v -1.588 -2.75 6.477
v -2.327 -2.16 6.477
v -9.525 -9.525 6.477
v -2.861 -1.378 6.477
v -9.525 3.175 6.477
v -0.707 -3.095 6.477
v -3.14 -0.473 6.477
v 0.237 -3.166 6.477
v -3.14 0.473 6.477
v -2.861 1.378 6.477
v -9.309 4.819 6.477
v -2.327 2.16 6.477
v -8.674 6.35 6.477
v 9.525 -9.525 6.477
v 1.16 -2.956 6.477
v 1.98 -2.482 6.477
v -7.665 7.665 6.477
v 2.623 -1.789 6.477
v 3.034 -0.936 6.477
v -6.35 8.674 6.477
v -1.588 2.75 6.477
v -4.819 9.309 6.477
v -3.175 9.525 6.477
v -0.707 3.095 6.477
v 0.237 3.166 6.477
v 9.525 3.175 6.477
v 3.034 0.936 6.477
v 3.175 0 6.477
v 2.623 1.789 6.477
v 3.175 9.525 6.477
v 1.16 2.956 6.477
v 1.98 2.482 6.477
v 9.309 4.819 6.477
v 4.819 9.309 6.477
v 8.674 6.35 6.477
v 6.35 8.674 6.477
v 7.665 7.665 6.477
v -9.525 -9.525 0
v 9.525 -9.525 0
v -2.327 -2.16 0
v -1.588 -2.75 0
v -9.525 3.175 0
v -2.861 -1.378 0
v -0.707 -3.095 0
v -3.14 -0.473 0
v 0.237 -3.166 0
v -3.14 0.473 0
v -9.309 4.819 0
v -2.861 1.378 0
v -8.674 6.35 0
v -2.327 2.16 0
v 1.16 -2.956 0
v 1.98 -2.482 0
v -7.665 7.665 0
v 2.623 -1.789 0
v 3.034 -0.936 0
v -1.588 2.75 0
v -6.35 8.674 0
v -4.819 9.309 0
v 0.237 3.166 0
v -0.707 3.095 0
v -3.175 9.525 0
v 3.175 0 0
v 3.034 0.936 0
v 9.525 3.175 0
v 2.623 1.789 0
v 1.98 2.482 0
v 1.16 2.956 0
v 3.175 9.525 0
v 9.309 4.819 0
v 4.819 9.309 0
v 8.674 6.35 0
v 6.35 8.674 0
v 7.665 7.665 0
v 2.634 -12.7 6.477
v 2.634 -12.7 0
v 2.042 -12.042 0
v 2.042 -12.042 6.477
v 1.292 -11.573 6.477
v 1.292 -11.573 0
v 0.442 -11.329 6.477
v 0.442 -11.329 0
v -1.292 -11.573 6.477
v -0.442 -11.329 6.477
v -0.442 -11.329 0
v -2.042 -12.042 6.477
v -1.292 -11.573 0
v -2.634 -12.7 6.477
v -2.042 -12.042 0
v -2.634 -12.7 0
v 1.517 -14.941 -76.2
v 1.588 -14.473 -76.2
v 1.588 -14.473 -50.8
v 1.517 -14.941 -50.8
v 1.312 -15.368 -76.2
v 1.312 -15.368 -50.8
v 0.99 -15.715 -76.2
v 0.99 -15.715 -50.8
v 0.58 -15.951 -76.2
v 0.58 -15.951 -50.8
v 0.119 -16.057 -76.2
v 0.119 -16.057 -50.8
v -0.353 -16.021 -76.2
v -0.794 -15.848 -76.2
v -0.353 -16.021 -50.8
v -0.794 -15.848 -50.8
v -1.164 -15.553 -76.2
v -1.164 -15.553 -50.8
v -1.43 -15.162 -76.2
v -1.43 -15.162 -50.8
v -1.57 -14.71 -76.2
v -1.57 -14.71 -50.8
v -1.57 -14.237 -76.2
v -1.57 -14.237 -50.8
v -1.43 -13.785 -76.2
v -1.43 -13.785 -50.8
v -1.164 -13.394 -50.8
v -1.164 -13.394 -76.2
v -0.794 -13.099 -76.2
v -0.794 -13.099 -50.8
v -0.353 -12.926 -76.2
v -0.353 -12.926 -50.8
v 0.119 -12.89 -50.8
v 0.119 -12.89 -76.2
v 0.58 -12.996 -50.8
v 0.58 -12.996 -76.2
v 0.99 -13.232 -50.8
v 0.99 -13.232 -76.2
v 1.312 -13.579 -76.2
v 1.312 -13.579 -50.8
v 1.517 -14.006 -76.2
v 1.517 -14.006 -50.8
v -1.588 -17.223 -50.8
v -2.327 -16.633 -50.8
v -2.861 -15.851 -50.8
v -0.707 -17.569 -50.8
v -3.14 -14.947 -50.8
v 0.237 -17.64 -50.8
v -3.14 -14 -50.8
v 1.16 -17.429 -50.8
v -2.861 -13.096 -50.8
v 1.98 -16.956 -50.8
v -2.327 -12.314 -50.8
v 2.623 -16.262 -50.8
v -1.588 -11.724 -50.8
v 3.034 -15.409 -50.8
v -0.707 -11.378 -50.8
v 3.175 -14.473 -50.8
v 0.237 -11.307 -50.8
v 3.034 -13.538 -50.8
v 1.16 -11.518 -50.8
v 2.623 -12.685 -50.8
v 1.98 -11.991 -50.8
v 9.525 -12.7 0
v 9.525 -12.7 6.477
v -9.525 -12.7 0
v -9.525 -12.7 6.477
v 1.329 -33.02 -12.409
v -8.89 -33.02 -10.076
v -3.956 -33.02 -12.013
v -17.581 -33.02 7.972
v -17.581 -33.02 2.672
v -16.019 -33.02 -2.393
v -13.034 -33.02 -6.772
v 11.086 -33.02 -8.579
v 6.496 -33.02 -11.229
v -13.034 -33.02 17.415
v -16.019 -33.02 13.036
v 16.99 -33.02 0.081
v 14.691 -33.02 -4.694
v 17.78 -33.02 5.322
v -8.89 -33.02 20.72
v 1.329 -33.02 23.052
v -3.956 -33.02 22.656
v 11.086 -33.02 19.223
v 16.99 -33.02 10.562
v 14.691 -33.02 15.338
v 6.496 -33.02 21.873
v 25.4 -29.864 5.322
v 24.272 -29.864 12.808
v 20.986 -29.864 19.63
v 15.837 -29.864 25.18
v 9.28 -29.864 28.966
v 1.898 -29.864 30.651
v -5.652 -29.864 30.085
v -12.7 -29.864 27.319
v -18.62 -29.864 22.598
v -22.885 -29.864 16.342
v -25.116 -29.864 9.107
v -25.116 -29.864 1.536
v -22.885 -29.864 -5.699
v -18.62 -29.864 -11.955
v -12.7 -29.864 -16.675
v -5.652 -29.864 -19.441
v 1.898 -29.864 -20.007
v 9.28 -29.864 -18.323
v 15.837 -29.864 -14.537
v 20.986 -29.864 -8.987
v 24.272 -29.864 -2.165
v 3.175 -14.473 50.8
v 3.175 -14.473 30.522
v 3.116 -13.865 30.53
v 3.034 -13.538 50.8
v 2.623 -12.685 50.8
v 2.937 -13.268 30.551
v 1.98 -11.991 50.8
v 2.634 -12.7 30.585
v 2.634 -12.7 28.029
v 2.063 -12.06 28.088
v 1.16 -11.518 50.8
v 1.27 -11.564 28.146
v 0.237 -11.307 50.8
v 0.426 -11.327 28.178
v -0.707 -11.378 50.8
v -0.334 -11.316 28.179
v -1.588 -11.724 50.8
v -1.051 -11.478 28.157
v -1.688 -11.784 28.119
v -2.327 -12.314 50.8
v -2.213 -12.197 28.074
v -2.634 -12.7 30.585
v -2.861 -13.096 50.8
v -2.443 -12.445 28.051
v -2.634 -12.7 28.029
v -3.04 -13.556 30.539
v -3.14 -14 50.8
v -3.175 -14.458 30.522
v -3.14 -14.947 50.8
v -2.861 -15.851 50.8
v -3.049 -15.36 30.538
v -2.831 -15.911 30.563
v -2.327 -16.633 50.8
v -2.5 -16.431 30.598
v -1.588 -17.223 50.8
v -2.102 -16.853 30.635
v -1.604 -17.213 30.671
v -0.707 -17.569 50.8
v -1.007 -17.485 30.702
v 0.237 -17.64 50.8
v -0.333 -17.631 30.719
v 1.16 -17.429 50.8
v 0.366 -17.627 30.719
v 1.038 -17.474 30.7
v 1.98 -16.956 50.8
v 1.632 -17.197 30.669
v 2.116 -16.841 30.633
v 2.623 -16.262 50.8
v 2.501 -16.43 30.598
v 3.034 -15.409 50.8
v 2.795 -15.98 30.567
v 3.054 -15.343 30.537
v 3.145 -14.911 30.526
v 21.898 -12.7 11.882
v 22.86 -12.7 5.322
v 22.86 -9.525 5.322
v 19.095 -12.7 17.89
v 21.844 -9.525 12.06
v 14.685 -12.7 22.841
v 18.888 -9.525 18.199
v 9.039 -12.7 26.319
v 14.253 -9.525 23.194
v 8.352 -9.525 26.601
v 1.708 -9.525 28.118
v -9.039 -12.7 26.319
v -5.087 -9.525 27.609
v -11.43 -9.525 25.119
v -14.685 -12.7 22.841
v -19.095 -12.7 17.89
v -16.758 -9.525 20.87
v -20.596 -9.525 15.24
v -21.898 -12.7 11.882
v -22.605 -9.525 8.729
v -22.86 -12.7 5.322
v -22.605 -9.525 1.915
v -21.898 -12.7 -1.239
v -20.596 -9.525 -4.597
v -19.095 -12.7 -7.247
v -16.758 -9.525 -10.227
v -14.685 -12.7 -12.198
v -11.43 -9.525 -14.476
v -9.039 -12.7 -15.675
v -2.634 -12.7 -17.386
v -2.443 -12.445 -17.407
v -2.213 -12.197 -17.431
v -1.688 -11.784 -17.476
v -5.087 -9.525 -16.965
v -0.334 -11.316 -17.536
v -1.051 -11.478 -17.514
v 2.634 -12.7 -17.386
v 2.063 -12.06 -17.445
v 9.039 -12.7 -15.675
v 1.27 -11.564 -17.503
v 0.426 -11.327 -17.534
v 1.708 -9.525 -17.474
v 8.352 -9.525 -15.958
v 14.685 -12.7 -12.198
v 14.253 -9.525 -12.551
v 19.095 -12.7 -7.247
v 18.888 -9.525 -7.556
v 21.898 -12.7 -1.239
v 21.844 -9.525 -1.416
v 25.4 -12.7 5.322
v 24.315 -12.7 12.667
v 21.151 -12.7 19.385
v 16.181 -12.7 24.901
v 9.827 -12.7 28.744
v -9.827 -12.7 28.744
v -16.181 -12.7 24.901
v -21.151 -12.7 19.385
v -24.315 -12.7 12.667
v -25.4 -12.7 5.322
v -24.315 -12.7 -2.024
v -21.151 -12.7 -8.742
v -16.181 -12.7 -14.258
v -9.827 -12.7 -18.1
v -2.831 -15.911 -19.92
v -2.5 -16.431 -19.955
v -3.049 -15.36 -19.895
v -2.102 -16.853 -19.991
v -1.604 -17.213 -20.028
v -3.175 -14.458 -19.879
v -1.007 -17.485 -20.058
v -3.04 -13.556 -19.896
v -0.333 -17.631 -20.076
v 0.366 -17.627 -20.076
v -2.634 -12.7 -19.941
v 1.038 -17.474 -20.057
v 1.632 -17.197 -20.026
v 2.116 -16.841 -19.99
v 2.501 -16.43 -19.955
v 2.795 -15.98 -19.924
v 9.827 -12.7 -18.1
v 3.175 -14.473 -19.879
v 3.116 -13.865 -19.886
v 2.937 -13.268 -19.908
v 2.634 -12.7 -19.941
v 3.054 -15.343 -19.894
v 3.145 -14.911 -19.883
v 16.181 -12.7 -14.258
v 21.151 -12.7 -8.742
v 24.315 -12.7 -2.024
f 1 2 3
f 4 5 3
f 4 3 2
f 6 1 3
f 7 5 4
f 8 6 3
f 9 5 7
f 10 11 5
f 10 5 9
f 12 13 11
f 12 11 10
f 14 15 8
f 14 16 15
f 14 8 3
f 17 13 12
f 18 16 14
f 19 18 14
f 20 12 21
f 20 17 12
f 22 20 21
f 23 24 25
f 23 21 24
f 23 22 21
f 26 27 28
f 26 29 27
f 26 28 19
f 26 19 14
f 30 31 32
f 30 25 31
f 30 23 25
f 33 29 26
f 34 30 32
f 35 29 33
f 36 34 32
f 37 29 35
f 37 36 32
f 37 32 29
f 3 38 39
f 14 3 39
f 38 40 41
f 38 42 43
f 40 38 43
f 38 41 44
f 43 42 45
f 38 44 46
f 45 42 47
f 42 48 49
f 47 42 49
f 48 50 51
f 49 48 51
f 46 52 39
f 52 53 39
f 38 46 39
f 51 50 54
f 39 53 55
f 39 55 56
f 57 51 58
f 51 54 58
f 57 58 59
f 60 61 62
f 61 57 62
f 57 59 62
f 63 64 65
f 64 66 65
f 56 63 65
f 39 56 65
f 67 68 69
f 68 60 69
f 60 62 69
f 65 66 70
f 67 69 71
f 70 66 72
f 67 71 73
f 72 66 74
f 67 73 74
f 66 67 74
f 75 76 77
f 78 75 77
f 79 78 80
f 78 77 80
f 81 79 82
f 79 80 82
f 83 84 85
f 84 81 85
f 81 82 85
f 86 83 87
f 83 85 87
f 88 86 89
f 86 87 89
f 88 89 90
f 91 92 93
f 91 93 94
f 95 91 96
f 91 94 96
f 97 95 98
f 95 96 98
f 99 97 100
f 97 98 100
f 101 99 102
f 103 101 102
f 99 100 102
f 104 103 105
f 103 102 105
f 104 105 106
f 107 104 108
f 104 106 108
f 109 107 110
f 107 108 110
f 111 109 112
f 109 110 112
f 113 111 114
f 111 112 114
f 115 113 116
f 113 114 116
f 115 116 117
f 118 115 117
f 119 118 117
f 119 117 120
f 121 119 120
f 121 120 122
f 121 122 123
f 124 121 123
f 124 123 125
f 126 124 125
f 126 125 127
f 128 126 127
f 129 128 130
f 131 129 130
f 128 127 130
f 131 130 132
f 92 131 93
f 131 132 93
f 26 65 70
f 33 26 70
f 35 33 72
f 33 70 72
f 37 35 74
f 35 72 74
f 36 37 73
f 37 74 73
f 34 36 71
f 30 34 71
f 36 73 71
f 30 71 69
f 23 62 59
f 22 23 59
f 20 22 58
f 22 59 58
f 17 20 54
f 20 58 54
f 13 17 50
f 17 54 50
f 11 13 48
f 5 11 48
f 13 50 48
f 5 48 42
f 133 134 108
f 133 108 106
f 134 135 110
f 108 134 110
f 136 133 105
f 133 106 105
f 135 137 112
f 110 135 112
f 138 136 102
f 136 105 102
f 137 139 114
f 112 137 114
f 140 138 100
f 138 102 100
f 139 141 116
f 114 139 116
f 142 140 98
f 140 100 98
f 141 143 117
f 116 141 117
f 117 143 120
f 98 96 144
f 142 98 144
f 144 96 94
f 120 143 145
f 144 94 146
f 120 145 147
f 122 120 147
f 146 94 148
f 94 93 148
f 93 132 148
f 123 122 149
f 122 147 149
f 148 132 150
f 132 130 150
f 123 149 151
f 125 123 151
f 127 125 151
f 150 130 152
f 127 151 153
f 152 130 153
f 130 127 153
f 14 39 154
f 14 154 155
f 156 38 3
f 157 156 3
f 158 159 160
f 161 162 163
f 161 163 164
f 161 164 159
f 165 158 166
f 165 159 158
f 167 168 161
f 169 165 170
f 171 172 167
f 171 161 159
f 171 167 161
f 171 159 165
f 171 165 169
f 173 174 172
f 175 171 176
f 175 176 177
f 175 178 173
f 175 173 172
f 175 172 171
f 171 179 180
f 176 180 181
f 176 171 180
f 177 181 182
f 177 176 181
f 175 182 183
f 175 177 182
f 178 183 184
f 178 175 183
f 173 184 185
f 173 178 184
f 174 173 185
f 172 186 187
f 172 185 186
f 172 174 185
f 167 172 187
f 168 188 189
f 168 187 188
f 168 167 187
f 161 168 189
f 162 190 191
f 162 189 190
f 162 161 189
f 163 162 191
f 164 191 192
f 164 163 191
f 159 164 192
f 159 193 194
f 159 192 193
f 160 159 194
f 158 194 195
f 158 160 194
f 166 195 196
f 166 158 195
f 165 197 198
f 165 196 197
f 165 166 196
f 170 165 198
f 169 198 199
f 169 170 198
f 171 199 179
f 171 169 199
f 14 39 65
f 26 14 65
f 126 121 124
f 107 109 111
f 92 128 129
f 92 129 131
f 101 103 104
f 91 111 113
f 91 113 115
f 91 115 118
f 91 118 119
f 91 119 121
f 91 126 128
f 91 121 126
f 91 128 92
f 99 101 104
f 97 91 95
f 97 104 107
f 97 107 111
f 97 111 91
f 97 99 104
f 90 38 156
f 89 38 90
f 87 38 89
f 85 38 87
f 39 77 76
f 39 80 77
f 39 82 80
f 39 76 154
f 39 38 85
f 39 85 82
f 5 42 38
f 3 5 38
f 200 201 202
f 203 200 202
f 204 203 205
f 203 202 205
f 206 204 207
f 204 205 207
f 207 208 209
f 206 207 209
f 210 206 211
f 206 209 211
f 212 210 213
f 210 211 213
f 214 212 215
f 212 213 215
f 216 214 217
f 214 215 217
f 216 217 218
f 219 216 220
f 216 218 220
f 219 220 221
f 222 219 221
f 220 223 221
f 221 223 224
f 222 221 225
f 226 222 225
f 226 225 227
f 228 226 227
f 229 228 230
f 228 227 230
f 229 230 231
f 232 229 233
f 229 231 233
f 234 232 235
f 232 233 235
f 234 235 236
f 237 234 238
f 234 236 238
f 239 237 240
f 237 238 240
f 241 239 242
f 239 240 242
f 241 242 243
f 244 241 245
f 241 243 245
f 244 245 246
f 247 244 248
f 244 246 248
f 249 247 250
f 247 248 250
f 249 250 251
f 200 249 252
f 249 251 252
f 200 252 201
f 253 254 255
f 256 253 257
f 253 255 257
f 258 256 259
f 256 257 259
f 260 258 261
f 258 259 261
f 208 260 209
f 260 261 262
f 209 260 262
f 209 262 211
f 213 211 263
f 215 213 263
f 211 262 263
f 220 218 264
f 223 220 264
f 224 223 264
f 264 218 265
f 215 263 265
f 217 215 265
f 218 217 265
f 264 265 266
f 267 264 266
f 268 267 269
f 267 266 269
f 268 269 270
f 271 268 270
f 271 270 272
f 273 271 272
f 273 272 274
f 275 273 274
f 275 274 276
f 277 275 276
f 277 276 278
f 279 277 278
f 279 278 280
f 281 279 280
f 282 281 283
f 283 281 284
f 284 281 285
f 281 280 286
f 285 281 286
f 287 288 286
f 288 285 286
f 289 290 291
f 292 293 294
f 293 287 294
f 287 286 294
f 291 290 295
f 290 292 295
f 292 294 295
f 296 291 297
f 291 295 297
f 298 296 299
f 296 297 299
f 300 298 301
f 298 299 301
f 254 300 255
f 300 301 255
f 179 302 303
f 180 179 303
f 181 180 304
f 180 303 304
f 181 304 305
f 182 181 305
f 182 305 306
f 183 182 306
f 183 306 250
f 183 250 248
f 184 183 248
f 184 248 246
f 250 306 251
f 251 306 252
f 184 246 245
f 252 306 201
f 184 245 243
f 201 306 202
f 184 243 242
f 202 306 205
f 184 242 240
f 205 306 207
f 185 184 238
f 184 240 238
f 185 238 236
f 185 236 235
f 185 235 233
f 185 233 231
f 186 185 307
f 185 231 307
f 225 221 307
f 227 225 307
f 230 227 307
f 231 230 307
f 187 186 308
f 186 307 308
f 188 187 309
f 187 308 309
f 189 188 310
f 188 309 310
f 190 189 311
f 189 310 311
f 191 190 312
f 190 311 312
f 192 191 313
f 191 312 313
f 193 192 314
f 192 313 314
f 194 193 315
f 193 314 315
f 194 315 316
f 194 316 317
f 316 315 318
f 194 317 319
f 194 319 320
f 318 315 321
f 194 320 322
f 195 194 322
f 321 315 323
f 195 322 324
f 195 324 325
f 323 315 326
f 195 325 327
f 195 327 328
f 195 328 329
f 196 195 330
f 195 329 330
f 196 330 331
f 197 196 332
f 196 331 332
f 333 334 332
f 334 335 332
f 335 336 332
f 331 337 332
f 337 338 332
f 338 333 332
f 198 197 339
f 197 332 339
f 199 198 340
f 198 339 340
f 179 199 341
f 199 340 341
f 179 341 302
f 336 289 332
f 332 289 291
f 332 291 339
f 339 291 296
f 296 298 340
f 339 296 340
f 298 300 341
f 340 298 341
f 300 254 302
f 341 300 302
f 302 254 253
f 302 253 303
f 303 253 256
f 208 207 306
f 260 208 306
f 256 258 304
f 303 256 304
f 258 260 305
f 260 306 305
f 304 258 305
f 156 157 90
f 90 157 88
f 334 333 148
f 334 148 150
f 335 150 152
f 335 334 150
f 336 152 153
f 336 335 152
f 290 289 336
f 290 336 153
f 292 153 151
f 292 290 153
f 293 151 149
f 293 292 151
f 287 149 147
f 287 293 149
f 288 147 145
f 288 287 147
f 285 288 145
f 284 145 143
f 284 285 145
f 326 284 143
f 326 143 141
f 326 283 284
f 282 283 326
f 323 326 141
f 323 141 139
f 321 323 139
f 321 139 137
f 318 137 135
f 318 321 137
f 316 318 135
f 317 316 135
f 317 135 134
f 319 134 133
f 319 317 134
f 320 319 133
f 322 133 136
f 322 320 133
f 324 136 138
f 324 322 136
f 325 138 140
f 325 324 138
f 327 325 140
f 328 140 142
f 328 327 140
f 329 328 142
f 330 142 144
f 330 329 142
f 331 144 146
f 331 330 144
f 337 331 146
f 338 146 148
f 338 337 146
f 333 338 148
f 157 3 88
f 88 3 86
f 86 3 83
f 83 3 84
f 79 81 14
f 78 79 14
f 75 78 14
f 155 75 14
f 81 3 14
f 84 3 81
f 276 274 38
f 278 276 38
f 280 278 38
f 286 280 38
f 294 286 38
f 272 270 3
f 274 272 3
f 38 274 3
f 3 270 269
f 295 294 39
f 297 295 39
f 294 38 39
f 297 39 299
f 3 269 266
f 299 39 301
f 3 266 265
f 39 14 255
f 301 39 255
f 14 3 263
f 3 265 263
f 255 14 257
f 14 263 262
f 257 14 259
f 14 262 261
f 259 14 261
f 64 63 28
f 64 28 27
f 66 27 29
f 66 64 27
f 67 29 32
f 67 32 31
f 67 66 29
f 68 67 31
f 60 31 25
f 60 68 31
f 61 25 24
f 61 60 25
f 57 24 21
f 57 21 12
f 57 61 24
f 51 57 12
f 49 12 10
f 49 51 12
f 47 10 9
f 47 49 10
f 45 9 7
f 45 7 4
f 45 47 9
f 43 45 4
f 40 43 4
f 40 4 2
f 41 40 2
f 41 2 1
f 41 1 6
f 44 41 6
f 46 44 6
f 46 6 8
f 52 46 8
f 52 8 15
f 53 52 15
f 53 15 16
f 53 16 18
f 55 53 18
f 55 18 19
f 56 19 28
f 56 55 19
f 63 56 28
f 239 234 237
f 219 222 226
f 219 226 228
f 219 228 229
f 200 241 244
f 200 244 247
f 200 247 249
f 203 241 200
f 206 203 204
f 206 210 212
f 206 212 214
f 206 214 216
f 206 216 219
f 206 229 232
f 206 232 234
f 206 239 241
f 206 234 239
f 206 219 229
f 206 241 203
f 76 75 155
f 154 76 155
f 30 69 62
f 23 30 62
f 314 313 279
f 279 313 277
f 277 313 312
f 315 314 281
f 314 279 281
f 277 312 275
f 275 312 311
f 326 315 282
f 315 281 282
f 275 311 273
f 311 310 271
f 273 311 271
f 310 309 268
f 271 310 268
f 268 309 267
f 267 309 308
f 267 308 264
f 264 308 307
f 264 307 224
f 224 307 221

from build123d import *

# Parameters (mm, degrees)
F0_R          = 3.175
F1_DEPTH      = 6.477
F2_R          = 22.86
F2_W          = 19.05
F2_H          = 6.477
F3_DEPTH      = 3.175
F4_R          = 25.4
F4_R_2        = 22.86
F4_W          = 19.05
F4_H          = 6.477
F5_DEPTH      = 20.32
F6_SIZE       = 2.54
F8_R          = 3.175
F9_DEPTH      = 50.8
F9_DEPTH_BACK = 50.8
F10_R         = 1.5875
F11_DEPTH     = 25.4


# Not quite as in the source:
# - a fillet or chamfer that OpenCascade refuses, or shapes differently, is made with other operations: its cross-section is extruded or revolved along the edge and cut away or added


with BuildPart() as f1:
    # F0 (on Top) → F1 (new body)
    with BuildSketch(Plane.XY):
        with BuildLine():
            ThreePointArc((9.525, 3.175), (7.6651280605, 7.6651280605), (3.175, 9.525))
            Line((3.175, 9.525), (-3.175, 9.525))
            ThreePointArc((-3.175, 9.525), (-7.6651280605, 7.6651280605), (-9.525, 3.175))
            Line((-9.525, 3.175), (-9.525, -9.525))
            Line((-9.525, -9.525), (9.525, -9.525))
            Line((9.525, -9.525), (9.525, 3.175))
        make_face()
        Circle(F0_R, mode=Mode.SUBTRACT)
    extrude(amount=F1_DEPTH)


with BuildPart() as f3:
    # F2 (on face) → F3 (new body)
    with BuildSketch(Plane.XZ.offset(9.525)):
        with Locations((0, 5.3216813781)):
            Circle(F2_R)
        with Locations((0, 3.2385)):
            Rectangle(F2_W, F2_H, mode=Mode.SUBTRACT)
    extrude(amount=F3_DEPTH)

    # F4 (on face) → F5 (join)
    with BuildSketch(Plane.XZ.offset(12.7)):
        with Locations((0, 5.3216813781)):
            Circle(F4_R)
        with Locations((0, 5.3216813781)):
            Circle(F4_R_2, mode=Mode.SUBTRACT)
        with Locations((0, 5.3216813781)):
            Circle(F4_R_2)
        with Locations((0, 3.2385)):
            Rectangle(F4_W, F4_H, mode=Mode.SUBTRACT)
        with Locations((0, 3.2385)):
            Rectangle(F4_W, F4_H)
    extrude(amount=F5_DEPTH)

    # F6
    f6_edges = [f3.edges().sort_by_distance(p)[0] for p in [
        (-25.4, -33.02, 5.321681),
    ]]
    chamfer(f6_edges, length=F6_SIZE)

    # F7: chamfer of 5.08 on 1 edges, made by hand

    # F7_s1 → F7_t2 (revolve, cut)
    with BuildSketch(Plane.XY.offset(5.3216813781)):
        Polygon((26.4521024484, -29.4278975516), (17.78, -33.02), (22.86, -33.02), align=None)
    revolve(axis=Axis((0, -33.02, 5.3216813781), (0, -1, 0)), mode=Mode.SUBTRACT)

    # F8 (on Top) → F9 (join, two sides)
    with BuildSketch(Plane.XY) as f9_sk:
        with Locations((0, -14.4734445528)):
            Circle(F8_R)
    extrude(amount=F9_DEPTH)
    extrude(f9_sk.sketch, amount=-F9_DEPTH_BACK)

    # F10 (on face) → F11 (join)
    with BuildSketch(Plane(origin=(0, 0, -50.8), x_dir=(1, 0, 0), z_dir=(0, 0, -1))):
        with Locations((0, 14.4734445528)):
            Circle(F10_R)
    extrude(amount=F11_DEPTH)


solid = Compound([f1.part, f3.part])
